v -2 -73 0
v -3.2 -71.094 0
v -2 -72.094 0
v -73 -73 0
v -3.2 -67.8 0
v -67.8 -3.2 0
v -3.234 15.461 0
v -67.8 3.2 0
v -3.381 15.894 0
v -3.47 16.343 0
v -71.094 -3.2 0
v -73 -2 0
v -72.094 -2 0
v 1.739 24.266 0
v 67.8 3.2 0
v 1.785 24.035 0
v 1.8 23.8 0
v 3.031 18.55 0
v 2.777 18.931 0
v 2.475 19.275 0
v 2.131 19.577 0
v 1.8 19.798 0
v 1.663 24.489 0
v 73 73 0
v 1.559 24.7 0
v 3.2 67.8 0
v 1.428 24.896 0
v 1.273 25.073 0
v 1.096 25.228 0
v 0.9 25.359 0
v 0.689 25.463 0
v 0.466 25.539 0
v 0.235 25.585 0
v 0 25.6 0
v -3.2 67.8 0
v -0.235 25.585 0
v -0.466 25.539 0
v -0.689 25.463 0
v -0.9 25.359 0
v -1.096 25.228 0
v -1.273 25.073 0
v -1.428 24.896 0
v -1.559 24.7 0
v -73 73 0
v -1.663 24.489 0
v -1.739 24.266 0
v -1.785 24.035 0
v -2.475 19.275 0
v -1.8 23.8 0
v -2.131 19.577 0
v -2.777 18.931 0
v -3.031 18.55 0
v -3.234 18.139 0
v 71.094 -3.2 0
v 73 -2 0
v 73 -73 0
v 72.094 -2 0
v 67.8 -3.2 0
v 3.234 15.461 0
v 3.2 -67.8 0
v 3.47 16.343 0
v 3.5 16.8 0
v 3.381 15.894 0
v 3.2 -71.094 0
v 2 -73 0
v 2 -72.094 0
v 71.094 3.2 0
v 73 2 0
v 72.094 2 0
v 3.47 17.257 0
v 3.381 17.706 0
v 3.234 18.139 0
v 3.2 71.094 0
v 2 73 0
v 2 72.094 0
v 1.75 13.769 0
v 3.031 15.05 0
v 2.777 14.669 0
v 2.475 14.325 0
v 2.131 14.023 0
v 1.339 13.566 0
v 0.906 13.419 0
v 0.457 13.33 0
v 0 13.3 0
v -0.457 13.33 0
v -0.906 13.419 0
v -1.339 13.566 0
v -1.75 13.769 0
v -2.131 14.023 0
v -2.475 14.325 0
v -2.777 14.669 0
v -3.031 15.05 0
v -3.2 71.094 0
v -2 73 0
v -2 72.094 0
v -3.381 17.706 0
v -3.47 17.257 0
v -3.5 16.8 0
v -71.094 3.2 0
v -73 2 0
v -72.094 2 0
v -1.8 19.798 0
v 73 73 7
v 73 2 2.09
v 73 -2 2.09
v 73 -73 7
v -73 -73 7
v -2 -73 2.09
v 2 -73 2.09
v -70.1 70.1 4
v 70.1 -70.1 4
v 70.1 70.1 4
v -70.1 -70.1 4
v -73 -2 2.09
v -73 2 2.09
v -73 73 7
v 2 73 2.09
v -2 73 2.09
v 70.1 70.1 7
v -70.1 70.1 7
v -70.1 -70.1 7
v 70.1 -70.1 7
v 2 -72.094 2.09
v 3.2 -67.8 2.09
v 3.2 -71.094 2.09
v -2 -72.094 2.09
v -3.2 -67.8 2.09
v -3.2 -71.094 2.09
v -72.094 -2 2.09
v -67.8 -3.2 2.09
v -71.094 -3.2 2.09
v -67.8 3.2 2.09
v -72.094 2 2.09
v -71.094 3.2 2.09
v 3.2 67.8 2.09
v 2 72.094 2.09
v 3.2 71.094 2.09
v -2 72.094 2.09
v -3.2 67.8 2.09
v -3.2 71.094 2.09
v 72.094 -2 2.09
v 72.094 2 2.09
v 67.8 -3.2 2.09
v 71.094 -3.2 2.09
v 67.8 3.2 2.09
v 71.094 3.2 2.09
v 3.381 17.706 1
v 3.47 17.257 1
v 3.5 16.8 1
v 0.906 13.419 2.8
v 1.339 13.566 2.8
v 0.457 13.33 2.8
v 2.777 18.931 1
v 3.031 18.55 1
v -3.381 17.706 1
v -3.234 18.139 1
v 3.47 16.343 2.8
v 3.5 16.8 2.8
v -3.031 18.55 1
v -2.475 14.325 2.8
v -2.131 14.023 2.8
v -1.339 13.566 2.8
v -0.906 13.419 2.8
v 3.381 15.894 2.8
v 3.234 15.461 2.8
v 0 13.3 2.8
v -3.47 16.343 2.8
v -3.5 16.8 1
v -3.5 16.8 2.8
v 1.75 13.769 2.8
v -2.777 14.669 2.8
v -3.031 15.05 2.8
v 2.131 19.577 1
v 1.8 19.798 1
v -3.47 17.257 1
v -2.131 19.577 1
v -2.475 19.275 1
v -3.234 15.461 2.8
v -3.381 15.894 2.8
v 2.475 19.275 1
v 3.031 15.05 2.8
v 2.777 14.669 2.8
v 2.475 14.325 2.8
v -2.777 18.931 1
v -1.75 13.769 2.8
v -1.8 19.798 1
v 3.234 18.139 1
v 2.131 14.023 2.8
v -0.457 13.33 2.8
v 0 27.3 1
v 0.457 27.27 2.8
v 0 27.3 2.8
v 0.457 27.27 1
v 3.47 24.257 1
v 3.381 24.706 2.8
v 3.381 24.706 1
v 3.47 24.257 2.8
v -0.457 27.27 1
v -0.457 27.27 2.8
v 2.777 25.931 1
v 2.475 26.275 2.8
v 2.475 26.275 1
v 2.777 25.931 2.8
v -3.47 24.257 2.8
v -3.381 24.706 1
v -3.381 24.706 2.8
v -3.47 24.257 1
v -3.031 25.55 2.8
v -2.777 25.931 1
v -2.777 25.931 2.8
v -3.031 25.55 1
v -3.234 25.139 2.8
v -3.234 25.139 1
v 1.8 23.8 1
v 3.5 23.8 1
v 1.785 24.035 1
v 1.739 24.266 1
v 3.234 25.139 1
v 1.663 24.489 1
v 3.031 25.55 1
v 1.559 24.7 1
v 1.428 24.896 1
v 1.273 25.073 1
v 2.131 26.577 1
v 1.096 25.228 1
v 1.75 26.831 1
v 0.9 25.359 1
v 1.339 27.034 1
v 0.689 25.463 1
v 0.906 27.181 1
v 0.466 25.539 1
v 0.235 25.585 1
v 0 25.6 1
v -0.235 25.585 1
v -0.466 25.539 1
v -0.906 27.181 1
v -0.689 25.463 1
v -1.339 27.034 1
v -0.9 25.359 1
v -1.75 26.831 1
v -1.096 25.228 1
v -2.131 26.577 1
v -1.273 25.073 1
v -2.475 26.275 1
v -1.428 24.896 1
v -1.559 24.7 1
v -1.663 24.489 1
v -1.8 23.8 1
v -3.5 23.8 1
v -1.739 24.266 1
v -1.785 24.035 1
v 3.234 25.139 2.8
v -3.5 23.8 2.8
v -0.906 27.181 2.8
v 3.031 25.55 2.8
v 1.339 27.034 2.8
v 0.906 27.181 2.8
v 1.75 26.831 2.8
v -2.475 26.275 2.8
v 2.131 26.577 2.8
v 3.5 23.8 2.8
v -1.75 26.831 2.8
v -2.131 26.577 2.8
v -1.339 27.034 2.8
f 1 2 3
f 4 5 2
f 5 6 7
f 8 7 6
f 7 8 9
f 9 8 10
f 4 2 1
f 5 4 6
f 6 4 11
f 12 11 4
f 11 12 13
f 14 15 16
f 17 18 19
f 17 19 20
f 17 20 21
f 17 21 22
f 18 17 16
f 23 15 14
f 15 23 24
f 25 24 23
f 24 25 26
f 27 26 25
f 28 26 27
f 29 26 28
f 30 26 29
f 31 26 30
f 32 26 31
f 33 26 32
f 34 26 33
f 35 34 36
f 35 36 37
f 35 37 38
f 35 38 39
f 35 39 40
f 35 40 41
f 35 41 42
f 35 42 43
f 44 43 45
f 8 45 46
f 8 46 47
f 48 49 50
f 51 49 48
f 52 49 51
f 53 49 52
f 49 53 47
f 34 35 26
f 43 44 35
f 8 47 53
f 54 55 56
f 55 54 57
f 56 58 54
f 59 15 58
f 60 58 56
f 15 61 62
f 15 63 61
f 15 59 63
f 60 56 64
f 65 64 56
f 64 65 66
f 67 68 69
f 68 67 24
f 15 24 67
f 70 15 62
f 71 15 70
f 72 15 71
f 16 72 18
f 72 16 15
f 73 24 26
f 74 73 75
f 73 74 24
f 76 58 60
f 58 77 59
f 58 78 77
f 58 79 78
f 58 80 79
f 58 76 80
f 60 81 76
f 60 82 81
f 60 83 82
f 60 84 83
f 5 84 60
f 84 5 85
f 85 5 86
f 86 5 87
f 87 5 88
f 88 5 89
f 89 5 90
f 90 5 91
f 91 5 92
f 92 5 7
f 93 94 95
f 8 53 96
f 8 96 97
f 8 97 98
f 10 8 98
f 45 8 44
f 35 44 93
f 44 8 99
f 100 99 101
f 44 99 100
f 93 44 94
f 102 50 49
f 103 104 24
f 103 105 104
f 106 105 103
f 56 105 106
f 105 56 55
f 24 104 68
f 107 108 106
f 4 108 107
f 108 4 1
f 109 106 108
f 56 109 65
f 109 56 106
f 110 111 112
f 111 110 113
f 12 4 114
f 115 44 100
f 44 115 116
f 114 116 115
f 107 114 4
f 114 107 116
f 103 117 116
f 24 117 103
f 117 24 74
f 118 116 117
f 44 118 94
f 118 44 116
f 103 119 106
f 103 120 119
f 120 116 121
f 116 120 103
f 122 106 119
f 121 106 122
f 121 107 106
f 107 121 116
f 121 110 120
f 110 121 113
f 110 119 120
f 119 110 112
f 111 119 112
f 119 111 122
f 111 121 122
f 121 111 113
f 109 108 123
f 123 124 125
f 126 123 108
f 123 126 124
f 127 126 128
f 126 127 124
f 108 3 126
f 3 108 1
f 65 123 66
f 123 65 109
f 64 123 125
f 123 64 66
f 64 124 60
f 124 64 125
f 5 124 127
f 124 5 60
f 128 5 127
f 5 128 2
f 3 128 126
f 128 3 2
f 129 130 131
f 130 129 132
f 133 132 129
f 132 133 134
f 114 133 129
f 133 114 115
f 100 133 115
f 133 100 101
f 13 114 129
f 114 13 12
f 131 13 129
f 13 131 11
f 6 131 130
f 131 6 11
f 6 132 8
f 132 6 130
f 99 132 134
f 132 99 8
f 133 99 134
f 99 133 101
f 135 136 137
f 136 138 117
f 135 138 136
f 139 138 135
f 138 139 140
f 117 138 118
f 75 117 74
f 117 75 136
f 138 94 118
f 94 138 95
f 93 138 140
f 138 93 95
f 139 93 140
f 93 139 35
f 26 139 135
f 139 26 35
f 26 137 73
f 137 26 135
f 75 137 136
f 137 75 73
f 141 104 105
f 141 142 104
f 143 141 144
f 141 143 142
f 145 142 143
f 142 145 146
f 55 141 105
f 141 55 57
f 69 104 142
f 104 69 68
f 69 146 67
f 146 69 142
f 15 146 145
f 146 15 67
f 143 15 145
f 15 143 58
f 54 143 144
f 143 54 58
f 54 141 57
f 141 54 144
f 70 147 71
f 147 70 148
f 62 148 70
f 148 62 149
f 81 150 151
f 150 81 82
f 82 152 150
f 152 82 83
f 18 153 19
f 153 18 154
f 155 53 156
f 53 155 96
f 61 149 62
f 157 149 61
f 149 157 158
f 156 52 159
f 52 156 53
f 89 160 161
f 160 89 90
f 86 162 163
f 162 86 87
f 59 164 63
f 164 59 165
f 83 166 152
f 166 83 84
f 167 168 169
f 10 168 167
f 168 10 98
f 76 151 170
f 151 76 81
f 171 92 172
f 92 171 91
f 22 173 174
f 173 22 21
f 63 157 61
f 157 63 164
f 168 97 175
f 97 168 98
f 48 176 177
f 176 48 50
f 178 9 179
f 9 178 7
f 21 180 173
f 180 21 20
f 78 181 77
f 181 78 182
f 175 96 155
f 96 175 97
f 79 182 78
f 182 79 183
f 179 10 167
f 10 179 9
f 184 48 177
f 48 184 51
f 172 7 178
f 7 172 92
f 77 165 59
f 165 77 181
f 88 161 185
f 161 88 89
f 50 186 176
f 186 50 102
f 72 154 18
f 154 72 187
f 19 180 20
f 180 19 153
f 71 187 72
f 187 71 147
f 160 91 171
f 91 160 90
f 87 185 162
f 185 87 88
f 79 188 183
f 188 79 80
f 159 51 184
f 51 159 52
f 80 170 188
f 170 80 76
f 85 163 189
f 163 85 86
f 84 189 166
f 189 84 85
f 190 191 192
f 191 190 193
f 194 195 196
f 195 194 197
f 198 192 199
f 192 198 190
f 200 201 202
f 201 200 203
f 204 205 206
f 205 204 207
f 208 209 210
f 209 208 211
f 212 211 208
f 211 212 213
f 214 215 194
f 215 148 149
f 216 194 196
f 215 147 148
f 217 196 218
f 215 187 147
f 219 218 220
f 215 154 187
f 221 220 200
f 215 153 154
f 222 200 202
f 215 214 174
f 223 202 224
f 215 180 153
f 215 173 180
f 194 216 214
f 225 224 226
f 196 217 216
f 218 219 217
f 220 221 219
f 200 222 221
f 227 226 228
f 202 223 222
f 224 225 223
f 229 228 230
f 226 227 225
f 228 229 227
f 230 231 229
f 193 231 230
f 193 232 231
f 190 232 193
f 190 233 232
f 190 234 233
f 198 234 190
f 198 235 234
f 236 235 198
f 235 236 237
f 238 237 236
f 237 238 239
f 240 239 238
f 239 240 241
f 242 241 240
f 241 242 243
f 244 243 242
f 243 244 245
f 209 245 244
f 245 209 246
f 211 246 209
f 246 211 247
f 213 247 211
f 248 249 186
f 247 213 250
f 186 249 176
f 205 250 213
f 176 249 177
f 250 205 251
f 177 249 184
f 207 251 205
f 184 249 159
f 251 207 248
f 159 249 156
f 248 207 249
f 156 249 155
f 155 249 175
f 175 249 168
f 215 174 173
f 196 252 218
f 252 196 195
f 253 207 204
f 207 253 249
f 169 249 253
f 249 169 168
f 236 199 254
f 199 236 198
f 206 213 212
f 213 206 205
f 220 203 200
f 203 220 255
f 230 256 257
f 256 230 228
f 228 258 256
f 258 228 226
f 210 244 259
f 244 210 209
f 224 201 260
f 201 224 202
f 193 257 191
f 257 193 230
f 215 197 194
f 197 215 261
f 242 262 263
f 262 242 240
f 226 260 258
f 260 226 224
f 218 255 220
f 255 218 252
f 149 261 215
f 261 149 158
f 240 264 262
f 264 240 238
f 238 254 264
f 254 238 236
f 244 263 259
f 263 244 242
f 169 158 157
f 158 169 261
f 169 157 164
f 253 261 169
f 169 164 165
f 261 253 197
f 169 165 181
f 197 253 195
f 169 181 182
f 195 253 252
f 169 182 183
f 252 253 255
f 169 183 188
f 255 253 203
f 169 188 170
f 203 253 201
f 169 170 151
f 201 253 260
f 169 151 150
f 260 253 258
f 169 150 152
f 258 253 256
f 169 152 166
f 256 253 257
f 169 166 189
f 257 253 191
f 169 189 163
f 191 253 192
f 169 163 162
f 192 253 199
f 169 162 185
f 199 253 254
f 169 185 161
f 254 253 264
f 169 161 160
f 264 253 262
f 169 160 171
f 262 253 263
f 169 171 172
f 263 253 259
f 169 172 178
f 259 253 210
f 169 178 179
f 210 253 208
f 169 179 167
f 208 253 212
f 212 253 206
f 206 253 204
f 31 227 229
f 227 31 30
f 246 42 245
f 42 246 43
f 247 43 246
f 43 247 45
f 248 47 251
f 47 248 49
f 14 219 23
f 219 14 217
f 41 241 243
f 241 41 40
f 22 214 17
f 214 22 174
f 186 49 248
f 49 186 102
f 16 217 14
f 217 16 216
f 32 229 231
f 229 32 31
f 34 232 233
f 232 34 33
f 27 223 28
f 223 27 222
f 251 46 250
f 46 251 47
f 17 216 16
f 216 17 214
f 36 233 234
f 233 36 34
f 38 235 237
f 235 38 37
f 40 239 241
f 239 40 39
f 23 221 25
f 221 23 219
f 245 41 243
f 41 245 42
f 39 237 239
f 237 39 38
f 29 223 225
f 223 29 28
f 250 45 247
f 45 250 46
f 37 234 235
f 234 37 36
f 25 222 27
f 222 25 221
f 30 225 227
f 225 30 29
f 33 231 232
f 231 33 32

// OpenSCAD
// Contour Studio square holder. mm. Same sockets and keyhole as modular map holders.
$fn=48; tile=140; gap=6; tolerance=.2; seat=4; rim=3;
module tile_shape(){polygon([[70.0, -70.0], [70.0, 70.0], [-70.0, 70.0], [-70.0, -70.0]]);}
module key_shape(){polygon([[-5,-3],[-2,-3],[-1,-1.8],[1,-1.8],[2,-3],[5,-3],[5,3],[2,3],[1,1.8],[-1,1.8],[-2,3],[-5,3]]);}
difference(){
 union(){linear_extrude(seat) offset(delta=gap/2) tile_shape();translate([0,0,seat]) linear_extrude(rim) difference(){offset(delta=gap/2) tile_shape();offset(delta=tolerance/2) tile_shape();}}
translate([0.0,-73.0,-.01]) rotate([0,0,-90.0]) linear_extrude(2.1) offset(delta=tolerance) key_shape();
translate([-73.0,0.0,-.01]) rotate([0,0,180.0]) linear_extrude(2.1) offset(delta=tolerance) key_shape();
translate([0.0,73.0,-.01]) rotate([0,0,90.0]) linear_extrude(2.1) offset(delta=tolerance) key_shape();
translate([73.0,0.0,-.01]) rotate([0,0,0.0]) linear_extrude(2.1) offset(delta=tolerance) key_shape();
translate([0,16.8,-.01]) cylinder(h=2.8,r=3.5);
translate([0,16.8,1]) linear_extrude(1.8) hull(){circle(r=3.5);translate([0,7]) circle(r=3.5);}
translate([0,16.8,-.01]) linear_extrude(1.1) hull(){circle(r=1.8);translate([0,7]) circle(r=1.8);}
}
